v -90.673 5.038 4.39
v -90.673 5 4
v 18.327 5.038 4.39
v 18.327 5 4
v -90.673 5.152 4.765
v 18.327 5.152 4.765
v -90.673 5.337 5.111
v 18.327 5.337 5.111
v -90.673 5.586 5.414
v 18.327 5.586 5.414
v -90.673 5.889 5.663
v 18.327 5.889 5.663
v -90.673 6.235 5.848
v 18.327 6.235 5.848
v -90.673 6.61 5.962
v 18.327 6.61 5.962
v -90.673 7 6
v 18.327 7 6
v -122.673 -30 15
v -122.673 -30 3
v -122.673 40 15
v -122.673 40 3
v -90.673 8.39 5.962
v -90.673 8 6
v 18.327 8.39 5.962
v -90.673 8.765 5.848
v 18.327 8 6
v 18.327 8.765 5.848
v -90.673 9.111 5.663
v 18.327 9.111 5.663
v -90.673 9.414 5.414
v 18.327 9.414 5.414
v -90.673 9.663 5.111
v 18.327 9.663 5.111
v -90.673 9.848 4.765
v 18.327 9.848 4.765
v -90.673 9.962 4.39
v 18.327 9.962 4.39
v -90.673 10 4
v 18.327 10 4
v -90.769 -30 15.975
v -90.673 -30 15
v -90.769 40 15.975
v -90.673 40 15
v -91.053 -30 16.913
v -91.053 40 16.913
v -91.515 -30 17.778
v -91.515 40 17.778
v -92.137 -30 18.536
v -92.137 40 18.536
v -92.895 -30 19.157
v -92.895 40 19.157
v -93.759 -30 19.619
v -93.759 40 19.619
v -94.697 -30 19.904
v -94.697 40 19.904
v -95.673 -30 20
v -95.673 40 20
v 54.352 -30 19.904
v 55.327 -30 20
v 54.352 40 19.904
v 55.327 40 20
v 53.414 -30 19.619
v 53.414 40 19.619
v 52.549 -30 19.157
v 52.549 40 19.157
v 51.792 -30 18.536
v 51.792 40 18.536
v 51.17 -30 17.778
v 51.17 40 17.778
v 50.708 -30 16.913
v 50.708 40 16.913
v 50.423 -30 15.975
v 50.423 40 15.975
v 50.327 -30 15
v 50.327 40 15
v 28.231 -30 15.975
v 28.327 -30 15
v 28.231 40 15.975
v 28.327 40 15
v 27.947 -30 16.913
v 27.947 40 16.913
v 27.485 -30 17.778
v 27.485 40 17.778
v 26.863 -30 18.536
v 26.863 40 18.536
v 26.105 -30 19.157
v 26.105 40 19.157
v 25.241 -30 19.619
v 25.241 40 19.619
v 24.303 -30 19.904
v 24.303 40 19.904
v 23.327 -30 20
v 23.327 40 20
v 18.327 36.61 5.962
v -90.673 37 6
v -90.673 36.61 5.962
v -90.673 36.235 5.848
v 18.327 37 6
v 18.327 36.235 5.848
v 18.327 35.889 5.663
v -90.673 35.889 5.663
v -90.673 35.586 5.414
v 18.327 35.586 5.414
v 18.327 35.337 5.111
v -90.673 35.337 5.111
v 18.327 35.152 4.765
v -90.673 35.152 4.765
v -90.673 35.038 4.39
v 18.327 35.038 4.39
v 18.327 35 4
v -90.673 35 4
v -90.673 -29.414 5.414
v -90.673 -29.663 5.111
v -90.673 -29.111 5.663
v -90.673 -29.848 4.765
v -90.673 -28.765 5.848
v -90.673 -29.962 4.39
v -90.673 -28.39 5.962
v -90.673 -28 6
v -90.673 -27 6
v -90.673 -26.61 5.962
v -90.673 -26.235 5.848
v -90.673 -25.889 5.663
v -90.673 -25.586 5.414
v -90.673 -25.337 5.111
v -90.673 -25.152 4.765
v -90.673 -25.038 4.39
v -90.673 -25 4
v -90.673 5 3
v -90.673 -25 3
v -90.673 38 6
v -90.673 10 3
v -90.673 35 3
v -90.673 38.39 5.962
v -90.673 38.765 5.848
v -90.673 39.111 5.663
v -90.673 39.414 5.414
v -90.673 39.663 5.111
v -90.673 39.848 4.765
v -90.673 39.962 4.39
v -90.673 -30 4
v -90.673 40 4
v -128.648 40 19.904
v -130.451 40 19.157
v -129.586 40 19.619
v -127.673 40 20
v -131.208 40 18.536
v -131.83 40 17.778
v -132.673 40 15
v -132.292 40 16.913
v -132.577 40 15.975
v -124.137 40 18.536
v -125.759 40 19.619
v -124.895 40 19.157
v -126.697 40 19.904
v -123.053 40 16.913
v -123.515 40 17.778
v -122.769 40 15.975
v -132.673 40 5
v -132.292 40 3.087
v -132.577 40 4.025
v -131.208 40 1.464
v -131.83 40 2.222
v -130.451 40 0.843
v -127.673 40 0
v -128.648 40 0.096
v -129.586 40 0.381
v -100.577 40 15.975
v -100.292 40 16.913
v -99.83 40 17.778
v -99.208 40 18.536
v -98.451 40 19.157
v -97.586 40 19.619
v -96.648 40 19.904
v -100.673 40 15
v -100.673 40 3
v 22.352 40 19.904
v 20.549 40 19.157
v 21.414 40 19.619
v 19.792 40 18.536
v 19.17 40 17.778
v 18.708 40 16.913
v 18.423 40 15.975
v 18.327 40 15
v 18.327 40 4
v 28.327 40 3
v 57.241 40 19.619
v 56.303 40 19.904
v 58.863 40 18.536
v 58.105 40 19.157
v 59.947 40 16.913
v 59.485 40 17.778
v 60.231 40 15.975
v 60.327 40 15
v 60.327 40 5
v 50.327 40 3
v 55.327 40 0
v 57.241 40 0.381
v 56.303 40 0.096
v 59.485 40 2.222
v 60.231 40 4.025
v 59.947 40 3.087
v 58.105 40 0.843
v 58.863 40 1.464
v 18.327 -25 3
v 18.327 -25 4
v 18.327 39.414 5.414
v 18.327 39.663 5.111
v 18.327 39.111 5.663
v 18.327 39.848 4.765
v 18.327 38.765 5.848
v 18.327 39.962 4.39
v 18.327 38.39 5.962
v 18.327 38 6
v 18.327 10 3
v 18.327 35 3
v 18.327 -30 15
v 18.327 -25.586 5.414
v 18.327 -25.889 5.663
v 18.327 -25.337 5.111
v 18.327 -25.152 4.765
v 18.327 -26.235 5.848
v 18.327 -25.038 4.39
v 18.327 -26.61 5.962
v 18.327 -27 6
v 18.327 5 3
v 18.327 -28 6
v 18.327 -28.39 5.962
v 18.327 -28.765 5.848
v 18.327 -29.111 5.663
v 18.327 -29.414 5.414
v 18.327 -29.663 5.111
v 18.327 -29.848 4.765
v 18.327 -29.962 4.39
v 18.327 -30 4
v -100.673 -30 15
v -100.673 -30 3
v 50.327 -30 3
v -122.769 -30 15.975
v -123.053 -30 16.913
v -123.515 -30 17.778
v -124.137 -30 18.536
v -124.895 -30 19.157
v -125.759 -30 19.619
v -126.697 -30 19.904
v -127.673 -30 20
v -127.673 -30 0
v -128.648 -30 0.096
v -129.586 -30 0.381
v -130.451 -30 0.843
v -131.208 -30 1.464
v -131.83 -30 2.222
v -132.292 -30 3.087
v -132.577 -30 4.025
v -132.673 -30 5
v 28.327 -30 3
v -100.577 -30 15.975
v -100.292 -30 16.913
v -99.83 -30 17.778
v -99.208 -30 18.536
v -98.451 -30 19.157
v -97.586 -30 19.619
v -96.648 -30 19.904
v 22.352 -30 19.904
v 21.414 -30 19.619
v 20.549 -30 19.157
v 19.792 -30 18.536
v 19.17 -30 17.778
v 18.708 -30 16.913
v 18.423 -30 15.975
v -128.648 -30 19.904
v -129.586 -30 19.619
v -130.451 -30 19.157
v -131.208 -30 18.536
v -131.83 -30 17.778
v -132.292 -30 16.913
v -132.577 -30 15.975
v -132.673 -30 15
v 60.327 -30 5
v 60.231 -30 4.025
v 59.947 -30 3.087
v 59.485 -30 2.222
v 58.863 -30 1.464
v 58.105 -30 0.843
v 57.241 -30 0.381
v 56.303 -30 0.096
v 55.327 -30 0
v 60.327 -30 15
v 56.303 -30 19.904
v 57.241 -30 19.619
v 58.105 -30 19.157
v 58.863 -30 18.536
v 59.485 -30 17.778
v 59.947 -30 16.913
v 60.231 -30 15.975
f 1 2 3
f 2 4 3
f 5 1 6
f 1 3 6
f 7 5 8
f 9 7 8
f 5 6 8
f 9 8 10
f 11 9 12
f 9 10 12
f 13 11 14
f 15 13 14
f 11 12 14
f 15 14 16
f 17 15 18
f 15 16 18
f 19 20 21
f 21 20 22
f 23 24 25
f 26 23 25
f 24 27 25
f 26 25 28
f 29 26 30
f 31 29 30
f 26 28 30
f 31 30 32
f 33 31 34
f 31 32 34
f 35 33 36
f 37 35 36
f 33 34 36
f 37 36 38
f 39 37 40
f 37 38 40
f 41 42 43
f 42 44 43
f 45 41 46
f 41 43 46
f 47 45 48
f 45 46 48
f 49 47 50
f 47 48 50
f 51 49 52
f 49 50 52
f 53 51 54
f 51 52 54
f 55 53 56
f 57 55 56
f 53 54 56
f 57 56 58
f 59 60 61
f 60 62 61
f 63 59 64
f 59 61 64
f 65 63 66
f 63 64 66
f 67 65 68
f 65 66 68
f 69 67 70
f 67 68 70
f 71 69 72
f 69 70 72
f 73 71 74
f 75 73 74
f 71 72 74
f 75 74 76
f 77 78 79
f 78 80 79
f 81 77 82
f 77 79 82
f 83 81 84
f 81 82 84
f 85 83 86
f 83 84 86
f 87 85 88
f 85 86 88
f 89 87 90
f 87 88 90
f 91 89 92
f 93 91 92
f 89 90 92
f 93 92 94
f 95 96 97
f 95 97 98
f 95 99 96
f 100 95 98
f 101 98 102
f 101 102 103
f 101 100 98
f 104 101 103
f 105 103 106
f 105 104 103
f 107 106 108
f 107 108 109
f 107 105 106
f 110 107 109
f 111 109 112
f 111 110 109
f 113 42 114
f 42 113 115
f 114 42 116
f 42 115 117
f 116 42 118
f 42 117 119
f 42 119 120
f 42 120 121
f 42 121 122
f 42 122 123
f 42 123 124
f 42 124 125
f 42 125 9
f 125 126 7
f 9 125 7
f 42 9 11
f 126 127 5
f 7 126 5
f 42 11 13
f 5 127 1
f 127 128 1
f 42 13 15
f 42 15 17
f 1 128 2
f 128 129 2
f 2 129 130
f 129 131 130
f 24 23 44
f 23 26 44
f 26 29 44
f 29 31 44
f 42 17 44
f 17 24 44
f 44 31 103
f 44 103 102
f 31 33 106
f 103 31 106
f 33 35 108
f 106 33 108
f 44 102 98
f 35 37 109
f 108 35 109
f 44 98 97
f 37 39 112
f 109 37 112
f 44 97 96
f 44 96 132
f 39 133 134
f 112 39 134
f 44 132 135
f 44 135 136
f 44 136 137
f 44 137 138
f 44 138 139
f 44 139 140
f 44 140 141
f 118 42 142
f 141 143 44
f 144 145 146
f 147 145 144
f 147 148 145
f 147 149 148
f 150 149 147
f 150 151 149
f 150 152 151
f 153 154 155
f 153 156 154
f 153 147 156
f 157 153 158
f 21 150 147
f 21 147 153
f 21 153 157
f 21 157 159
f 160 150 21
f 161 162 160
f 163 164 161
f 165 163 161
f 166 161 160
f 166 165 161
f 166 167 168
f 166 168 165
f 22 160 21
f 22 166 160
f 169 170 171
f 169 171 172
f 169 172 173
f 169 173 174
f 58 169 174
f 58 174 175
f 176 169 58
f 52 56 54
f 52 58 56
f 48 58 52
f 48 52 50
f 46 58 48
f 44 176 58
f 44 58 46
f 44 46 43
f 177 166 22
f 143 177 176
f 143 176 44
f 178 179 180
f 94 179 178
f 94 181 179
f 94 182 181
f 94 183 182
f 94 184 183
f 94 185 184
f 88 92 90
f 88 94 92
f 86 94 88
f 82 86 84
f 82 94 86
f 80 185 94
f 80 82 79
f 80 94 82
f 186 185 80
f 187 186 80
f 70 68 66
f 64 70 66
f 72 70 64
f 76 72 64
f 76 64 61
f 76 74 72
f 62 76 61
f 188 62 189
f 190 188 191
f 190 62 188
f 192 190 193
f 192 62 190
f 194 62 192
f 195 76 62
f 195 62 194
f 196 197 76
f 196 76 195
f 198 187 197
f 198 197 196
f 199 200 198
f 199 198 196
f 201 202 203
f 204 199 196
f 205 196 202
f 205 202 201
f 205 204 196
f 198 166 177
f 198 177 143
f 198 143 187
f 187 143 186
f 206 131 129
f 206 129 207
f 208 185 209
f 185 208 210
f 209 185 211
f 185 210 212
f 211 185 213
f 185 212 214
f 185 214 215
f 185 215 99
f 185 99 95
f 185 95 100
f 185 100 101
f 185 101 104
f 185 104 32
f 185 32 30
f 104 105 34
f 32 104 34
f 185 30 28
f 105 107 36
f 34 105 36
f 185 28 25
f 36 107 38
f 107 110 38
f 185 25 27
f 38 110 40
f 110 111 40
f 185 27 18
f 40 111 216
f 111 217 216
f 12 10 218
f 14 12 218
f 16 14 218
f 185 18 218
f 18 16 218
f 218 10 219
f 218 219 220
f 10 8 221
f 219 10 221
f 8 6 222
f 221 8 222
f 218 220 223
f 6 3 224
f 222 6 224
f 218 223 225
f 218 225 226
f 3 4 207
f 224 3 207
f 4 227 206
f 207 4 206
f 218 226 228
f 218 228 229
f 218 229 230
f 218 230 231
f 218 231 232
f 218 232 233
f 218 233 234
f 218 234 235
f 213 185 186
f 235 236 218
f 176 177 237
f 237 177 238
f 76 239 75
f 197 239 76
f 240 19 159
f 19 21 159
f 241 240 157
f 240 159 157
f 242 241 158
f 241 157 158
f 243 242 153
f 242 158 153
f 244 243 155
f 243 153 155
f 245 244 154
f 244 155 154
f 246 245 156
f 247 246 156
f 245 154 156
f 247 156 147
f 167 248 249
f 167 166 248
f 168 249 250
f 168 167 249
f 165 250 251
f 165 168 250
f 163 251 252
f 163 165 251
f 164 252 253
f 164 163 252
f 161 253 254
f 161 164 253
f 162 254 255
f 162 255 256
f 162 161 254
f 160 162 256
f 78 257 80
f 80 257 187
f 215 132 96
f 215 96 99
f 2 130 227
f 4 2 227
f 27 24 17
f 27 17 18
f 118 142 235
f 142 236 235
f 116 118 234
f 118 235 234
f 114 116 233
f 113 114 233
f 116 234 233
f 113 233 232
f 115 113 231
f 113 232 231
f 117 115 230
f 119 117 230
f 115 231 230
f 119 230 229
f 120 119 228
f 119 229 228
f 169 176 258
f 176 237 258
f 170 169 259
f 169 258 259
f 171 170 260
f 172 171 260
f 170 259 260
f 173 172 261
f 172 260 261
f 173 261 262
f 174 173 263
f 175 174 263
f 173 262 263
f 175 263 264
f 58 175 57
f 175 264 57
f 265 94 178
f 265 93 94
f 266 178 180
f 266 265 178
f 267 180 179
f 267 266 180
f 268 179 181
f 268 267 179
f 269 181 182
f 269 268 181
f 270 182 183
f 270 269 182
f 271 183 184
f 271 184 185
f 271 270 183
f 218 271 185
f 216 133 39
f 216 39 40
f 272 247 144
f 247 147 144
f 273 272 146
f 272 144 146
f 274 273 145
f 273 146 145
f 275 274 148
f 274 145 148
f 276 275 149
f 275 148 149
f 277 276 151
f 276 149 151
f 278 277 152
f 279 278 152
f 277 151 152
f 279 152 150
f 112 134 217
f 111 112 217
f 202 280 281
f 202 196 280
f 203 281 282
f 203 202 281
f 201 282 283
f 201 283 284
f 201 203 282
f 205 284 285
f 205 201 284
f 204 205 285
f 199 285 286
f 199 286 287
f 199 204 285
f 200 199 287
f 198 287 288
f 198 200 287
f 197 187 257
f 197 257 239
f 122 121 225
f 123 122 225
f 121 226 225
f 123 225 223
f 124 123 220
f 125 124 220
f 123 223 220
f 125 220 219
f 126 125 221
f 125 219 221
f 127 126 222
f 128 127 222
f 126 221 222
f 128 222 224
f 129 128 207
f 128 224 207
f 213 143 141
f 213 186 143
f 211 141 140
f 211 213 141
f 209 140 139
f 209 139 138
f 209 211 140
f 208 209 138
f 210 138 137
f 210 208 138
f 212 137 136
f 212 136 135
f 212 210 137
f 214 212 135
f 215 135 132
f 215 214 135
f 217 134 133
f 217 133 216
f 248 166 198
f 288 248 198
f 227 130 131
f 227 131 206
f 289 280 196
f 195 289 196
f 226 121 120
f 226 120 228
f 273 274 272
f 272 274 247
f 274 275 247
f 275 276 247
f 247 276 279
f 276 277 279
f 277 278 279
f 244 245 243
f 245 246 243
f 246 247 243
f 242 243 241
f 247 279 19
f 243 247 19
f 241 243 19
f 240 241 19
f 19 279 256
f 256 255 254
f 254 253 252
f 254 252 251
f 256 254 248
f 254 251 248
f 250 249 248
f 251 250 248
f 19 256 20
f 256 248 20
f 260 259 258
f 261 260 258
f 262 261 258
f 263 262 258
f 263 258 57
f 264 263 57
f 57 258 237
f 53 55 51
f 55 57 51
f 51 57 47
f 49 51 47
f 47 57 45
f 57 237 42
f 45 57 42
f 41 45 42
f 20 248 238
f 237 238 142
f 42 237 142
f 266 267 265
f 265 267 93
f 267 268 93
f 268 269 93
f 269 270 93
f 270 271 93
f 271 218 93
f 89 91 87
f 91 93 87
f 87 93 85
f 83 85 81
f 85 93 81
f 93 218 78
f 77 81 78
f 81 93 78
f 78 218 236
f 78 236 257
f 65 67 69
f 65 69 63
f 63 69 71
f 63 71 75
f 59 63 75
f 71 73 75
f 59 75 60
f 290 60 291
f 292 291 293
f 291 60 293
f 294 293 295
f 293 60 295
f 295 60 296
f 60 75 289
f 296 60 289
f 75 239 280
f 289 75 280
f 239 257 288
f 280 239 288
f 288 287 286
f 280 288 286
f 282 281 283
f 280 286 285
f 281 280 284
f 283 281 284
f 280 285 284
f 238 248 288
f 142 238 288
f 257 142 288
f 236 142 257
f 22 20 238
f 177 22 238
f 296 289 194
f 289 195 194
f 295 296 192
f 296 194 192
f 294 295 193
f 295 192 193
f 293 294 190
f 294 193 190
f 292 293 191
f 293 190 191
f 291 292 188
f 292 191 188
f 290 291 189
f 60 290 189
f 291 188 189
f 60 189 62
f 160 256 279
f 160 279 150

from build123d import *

# Parameters (mm, degrees)
F0_W     = 22
F0_H     = 70
F1_DEPTH = 3
F0_W_2   = 109
F0_H_2   = 25
F0_H_3   = 30
F0_W_3   = 10
F2_DEPTH = 20
F0_H_4   = 5
F3_DEPTH = 6
F4_R     = 4.99999
F5_R     = 5
F6_R     = 2


# Not quite as in the source:
# - a fillet or chamfer is up to 0.001 mm smaller than in the source, because OpenCascade refuses the exact size


with BuildPart() as f1:
    # F0 (on Top) → F1 (new body)
    with BuildSketch(Plane.XY):
        with Locations((-111.672727108, 5)):
            Rectangle(F0_W, F0_H)
    extrude(amount=F1_DEPTH)



with BuildPart() as f1b:
    # F0 (on Top) → F1, piece 2 (new body)
    with BuildSketch(Plane.XY):
        with Locations((39.327272892, 5)):
            Rectangle(F0_W, F0_H)
    extrude(amount=F1_DEPTH)


with BuildPart() as f1c:
    # F0 (on Top) → F1, piece 3 (new body)
    with BuildSketch(Plane.XY):
        with Locations((-36.172727108, 22.5)):
            Rectangle(F0_W_2, F0_H_2)
    extrude(amount=F1_DEPTH)


with BuildPart() as f1d:
    # F0 (on Top) → F1, piece 4 (new body)
    with BuildSketch(Plane.XY):
        with Locations((-36.172727108, -10)):
            Rectangle(F0_W_2, F0_H_3)
    extrude(amount=F1_DEPTH)


with BuildPart() as f1_1:
    add(f1.part)

    add(f1b.part)  # F2 merges F1b

    add(f1c.part)  # F2 merges F1c

    add(f1d.part)  # F2 merges F1d
    # F0 (on Top) → F2 (join)
    with BuildSketch(Plane.XY):
        with Locations((55.327272892, 5)):
            Rectangle(F0_W_3, F0_H)
        with Locations((-127.672727108, 5)):
            Rectangle(F0_W_3, F0_H)
        Polygon((-100.672727108, -30), (-90.672727108, -30), (-90.672727108, -25), (-90.672727108, 5), (-90.672727108, 10), (-90.672727108, 35), (-90.672727108, 40), (-100.672727108, 40), align=None)
        Polygon((18.327272892, -30), (28.327272892, -30), (28.327272892, 40), (18.327272892, 40), (18.327272892, 35), (18.327272892, 10), (18.327272892, 5), (18.327272892, -25), align=None)
    extrude(amount=F2_DEPTH)

    # F0 (on Top) → F3 (join)
    with BuildSketch(Plane.XY):
        with Locations((-36.172727108, 7.5)):
            Rectangle(F0_W_2, F0_H_4)
        with Locations((-36.172727108, -27.5)):
            Rectangle(F0_W_2, F0_H_4)
        with Locations((-36.172727108, 37.5)):
            Rectangle(F0_W_2, F0_H_4)
    extrude(amount=F3_DEPTH)

    # F4 (radius 5 in the source; OpenCascade refuses exactly that, so slightly less here)
    f4_edges = [f1_1.edges().sort_by_distance(p)[0] for p in [
        (50.327273, 5, 20),
        (28.327273, 5, 20),
        (-100.672727, 5, 20),
        (-122.672727, 5, 20),
        (-132.672727, 5, 20),
        (-90.672727, 5, 20),
        (18.327273, 5, 20),
        (60.327273, 5, 20),
    ]]
    fillet(f4_edges, radius=F4_R)

    # F5
    f5_edges = [f1_1.edges().sort_by_distance(p)[0] for p in [
        (-132.672727, 5, 0),
        (60.327273, 5, 0),
    ]]
    fillet(f5_edges, radius=F5_R)

    # F6
    f6_edges = [f1_1.edges().sort_by_distance(p)[0] for p in [
        (-36.172727, 5, 6),
        (-36.172727, 10, 6),
        (-36.172727, -30, 6),
        (-36.172727, 40, 6),
        (-36.172727, 35, 6),
        (-36.172727, -25, 6),
    ]]
    fillet(f6_edges, radius=F6_R)


solid = f1_1.part
